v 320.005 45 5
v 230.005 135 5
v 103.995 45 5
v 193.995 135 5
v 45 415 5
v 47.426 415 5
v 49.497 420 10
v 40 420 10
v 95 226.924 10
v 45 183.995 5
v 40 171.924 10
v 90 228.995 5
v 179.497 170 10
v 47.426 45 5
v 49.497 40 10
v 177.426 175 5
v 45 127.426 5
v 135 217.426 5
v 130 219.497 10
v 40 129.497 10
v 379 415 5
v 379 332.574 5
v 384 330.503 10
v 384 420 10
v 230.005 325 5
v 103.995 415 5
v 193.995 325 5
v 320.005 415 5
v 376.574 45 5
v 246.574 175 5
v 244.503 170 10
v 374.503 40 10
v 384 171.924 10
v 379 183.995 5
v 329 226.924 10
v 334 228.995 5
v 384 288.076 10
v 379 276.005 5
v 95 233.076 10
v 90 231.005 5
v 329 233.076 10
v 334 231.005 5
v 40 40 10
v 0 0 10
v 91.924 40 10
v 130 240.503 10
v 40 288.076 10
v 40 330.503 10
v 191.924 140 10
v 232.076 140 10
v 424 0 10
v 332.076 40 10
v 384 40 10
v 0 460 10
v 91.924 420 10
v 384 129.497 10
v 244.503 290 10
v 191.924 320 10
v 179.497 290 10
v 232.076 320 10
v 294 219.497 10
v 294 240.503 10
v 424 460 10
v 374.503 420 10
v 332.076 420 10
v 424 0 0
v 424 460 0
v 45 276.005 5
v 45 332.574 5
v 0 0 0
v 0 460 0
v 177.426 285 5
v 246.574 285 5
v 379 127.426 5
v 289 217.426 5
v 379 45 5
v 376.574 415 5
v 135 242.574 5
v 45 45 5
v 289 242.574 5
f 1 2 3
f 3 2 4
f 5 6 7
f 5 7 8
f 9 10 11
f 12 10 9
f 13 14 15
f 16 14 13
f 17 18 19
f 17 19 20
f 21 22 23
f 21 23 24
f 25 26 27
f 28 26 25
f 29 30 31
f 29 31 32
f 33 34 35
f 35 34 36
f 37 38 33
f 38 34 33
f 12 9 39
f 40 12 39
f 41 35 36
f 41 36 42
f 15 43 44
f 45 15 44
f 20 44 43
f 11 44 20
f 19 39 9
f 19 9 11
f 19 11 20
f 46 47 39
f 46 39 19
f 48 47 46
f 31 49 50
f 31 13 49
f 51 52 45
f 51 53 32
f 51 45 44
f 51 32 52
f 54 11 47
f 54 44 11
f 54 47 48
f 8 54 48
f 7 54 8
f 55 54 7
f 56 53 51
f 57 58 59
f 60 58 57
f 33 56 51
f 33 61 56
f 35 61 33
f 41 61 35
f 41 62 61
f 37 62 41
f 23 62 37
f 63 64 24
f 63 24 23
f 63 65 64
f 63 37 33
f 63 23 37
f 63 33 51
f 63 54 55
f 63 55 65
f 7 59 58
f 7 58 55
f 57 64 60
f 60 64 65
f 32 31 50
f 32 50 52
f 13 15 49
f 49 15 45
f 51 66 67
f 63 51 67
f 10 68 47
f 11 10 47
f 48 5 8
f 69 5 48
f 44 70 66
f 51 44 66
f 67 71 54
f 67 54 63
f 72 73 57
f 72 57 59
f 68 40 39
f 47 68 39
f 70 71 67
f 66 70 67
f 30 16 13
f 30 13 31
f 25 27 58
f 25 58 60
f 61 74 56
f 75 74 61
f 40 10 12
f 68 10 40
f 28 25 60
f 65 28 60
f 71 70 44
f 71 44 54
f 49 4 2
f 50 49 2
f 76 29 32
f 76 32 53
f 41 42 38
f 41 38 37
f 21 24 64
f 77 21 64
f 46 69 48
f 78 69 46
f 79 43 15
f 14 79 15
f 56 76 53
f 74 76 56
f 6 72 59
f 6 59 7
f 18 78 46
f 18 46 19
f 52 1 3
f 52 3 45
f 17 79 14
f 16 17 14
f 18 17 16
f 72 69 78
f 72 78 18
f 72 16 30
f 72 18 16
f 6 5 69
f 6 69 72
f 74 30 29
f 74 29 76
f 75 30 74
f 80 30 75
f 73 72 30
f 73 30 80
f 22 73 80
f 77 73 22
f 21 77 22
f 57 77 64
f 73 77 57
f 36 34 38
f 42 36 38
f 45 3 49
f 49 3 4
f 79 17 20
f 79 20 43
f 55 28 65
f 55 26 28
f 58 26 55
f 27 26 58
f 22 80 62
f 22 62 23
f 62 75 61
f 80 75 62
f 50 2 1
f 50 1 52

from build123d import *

# Parameters (mm, degrees)
ESQUISSE1_W             = 424
ESQUISSE1_H             = 460
BOSS_EXTRU_1_DEPTH      = 10
ENL_V_MAT_EXTRU_1_DEPTH = 5
CHANFREIN1_SIZE         = 5


with BuildPart() as part:
    # Esquisse1 → Boss.-Extru.1 (new body)
    with BuildSketch(Plane.XY):
        with Locations((212, 230)):
            Rectangle(ESQUISSE1_W, ESQUISSE1_H)
    extrude(amount=BOSS_EXTRU_1_DEPTH)

    # Esquisse2 → Enlèv. mat.-Extru.1 (cut)
    with BuildSketch(Plane.XY.offset(10)):
        Polygon((95, 226.923881554), (95, 233.076118446), (40, 288.076118446), (40, 171.923881554), align=None)
        Polygon((191.923881554, 320), (232.076118446, 320), (332.076118446, 420), (91.923881554, 420), align=None)
        Polygon((40, 420), (40, 330.502525317), (130, 240.502525317), (130, 219.497474683), (40, 129.497474683), (40, 40), (49.497474683, 40), (179.497474683, 170), (244.502525317, 170), (374.502525317, 40), (384, 40), (384, 129.497474683), (294, 219.497474683), (294, 240.502525317), (384, 330.502525317), (384, 420), (374.502525317, 420), (244.502525317, 290), (179.497474683, 290), (49.497474683, 420), align=None)
        Polygon((329, 226.923881554), (329, 233.076118446), (384, 288.076118446), (384, 171.923881554), align=None)
        Polygon((332.076118446, 40), (91.923881554, 40), (191.923881554, 140), (232.076118446, 140), align=None)
    extrude(amount=-ENL_V_MAT_EXTRU_1_DEPTH, mode=Mode.SUBTRACT)

    # Chanfrein1
    chanfrein1_edges = [part.edges().sort_by_distance(p)[0] for p in [
        (212, 40, 5),
        (141.923881554, 90, 5),
        (212, 140, 5),
        (282.076118446, 90, 5),
        (40, 230, 5),
        (67.5, 260.576118446, 5),
        (95, 230, 5),
        (67.5, 199.423881554, 5),
        (384, 230, 5),
        (356.5, 199.423881554, 5),
        (329, 230, 5),
        (356.5, 260.576118446, 5),
        (114.497474683, 355, 5),
        (212, 290, 5),
        (309.502525317, 355, 5),
        (379.251262658, 420, 5),
        (384, 375.251262658, 5),
        (339, 285.502525317, 5),
        (294, 230, 5),
        (339, 174.497474683, 5),
        (384, 84.748737342, 5),
        (379.251262658, 40, 5),
        (309.502525317, 105, 5),
        (212, 170, 5),
        (114.497474683, 105, 5),
        (44.748737342, 40, 5),
        (40, 84.748737342, 5),
        (85, 174.497474683, 5),
        (130, 230, 5),
        (85, 285.502525317, 5),
        (40, 375.251262658, 5),
        (44.748737342, 420, 5),
        (212, 420, 5),
        (282.076118446, 370, 5),
        (212, 320, 5),
        (141.923881554, 370, 5),
    ]]
    chamfer(chanfrein1_edges, length=CHANFREIN1_SIZE - 0.0001)  # a hair under: the kernel refuses the full size


solid = part.part
